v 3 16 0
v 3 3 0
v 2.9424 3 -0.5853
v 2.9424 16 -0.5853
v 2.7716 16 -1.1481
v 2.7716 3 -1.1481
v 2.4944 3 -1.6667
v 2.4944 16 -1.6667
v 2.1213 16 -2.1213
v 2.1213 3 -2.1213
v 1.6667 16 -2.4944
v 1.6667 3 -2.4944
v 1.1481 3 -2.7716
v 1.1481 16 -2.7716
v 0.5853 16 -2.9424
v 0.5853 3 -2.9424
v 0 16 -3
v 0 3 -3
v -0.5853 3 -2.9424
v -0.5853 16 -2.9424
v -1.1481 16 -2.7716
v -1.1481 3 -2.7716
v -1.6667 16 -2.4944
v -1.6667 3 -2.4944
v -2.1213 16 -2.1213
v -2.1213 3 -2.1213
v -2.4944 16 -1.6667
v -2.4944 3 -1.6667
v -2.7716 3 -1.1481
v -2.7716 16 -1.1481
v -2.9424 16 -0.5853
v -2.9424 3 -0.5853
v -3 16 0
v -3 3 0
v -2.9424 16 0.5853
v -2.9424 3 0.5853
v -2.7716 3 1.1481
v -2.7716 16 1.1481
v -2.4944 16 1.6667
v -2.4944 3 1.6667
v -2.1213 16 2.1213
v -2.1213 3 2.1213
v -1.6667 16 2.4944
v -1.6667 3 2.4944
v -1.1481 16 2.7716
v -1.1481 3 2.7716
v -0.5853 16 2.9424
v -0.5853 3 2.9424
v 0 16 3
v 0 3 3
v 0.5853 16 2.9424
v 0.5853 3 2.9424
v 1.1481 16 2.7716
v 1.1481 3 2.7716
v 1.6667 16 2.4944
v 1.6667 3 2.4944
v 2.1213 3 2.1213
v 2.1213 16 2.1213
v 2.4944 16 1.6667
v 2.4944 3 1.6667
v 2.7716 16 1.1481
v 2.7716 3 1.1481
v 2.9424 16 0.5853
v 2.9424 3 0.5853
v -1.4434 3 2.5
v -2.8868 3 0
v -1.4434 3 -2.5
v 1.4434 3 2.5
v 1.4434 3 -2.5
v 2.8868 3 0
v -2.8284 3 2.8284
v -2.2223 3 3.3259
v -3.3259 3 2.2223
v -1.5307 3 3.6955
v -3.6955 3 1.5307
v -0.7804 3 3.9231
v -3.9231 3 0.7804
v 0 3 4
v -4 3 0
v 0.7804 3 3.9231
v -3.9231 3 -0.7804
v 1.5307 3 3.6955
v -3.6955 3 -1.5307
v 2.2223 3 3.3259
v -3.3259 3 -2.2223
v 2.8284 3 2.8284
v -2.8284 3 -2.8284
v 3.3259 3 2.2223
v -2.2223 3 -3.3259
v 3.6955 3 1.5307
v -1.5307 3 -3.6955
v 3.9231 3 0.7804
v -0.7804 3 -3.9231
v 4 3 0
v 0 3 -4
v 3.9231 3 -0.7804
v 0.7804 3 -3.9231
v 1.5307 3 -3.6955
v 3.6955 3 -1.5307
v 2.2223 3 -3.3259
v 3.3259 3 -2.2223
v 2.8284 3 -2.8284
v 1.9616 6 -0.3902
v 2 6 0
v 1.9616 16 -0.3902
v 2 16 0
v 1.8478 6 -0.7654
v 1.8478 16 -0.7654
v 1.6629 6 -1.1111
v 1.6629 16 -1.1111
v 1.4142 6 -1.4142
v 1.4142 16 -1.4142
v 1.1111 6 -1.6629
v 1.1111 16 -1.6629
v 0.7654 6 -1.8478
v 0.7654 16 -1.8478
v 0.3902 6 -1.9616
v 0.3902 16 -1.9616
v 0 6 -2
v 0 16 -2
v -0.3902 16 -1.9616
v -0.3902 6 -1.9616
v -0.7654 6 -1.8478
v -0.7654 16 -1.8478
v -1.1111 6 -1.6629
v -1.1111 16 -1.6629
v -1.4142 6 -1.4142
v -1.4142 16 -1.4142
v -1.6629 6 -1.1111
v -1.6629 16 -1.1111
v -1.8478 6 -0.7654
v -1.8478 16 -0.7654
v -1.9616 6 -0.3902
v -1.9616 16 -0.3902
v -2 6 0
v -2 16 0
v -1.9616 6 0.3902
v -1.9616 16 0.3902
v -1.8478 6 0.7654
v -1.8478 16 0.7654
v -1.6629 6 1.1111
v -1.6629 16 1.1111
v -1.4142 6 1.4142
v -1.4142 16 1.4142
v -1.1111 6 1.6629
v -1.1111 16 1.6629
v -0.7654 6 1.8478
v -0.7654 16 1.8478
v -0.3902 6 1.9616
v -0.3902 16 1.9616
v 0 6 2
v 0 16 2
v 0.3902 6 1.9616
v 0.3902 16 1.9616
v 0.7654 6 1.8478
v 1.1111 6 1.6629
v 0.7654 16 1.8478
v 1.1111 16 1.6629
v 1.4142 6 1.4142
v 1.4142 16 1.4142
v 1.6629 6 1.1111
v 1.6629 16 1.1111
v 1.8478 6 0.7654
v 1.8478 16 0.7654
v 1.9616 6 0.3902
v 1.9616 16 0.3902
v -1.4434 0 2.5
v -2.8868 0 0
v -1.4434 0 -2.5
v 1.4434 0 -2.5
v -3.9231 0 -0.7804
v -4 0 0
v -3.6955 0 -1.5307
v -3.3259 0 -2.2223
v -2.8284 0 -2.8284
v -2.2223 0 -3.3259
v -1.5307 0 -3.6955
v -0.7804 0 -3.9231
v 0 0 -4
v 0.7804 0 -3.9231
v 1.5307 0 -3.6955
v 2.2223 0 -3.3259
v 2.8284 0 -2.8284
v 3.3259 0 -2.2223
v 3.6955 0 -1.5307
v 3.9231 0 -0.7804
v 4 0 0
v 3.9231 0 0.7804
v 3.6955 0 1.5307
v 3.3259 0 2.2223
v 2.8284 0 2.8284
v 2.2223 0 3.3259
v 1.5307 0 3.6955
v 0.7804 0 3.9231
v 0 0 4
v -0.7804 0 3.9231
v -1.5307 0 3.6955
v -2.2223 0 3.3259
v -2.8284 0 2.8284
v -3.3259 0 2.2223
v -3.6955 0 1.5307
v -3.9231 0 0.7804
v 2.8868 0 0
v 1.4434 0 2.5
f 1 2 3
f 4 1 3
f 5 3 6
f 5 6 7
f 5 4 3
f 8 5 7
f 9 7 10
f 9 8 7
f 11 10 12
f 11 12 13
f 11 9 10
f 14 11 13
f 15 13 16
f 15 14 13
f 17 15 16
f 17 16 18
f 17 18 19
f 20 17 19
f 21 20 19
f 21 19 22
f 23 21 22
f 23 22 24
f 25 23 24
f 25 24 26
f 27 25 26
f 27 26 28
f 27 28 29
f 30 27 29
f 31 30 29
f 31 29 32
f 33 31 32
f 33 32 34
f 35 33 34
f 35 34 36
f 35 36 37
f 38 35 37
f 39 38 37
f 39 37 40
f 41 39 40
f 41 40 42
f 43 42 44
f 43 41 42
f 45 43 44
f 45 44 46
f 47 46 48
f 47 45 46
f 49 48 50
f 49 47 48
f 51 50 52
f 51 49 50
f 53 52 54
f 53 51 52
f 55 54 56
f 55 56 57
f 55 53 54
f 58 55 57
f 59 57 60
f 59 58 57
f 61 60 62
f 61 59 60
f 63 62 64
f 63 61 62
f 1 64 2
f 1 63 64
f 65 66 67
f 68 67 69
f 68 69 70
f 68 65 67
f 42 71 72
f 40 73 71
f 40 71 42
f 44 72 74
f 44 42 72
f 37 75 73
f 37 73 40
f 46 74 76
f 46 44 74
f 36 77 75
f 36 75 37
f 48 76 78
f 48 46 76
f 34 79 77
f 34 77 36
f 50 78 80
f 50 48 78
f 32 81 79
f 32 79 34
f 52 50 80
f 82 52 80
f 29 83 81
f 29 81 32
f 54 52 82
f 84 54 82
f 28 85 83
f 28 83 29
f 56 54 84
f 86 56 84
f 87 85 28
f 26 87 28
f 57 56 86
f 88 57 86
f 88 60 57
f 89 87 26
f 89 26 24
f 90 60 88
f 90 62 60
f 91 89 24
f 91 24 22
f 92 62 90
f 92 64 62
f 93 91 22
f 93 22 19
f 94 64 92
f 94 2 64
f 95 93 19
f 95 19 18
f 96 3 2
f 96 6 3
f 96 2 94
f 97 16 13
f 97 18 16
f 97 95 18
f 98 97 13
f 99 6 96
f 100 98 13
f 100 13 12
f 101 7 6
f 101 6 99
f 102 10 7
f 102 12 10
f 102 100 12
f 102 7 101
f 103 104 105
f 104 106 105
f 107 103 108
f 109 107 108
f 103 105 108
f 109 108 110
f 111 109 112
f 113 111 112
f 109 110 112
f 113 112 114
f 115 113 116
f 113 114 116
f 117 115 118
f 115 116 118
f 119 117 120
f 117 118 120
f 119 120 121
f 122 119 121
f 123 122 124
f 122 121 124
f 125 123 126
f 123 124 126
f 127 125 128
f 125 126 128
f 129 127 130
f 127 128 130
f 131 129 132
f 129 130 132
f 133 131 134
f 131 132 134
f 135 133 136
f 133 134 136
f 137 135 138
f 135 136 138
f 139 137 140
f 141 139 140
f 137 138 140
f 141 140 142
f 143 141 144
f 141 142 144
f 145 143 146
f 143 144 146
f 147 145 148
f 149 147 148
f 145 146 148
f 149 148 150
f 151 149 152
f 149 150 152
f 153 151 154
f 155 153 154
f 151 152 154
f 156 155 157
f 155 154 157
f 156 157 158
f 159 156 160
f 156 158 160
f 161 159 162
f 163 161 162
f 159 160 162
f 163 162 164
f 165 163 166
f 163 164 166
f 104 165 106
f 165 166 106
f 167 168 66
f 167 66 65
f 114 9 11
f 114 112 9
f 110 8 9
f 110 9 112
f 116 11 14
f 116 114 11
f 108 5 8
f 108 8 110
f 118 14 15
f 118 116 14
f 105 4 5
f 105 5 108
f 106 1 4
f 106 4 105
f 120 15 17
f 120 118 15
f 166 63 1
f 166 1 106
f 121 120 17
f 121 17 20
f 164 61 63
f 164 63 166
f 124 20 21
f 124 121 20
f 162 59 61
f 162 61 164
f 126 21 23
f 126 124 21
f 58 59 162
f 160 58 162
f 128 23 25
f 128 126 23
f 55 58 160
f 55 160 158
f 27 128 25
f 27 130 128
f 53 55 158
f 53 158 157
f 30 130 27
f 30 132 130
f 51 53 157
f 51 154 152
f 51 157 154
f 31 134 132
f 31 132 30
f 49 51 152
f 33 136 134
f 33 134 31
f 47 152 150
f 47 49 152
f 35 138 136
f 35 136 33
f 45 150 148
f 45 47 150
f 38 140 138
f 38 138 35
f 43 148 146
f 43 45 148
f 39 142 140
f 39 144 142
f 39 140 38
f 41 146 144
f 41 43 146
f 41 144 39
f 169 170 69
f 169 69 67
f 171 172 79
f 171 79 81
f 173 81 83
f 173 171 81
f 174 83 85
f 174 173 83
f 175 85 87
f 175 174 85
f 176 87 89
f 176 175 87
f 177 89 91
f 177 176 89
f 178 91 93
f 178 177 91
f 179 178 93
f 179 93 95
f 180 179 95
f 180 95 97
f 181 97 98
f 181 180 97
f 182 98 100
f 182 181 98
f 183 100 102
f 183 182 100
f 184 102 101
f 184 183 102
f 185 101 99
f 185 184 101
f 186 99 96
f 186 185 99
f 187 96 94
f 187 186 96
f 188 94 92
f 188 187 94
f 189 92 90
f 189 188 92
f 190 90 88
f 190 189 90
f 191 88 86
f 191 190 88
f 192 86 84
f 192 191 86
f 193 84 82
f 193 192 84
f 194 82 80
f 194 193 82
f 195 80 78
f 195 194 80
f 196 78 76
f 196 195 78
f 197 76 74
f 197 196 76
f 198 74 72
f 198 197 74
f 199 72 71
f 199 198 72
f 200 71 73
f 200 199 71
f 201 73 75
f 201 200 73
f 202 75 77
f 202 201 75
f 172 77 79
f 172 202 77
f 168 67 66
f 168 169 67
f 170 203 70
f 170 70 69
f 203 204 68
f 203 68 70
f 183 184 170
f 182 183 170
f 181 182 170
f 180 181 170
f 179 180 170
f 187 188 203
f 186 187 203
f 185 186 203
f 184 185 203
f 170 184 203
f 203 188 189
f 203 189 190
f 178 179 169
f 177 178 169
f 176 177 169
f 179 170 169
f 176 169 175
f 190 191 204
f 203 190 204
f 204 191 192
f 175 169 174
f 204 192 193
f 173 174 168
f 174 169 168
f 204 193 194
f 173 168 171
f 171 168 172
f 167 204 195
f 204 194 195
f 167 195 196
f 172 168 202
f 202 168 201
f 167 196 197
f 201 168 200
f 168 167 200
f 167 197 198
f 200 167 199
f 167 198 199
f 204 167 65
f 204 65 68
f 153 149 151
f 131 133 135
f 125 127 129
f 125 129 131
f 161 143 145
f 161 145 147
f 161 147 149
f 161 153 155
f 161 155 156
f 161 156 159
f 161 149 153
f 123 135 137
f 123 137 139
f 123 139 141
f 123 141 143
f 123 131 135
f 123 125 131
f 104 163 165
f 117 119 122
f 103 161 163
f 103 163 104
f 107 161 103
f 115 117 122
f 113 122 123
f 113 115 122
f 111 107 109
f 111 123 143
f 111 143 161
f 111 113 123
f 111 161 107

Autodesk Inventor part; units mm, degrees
ref_plane "YZ Plane" through (0, 0, 0) normal (1, 0, 0) x (0, 1, 0)
ref_plane "XZ Plane" through (0, 0, 0) normal (0, 1, 0) x (-1, 0, 0)
ref_plane "XY Plane" through (0, 0, 0) normal (0, 0, 1) x (1, 0, 0)
sketch "Náčrt1" plane through (0, 0, 0) normal (0, 1, 0) x (-1, 0, 0)
  circle A0 centre (0, 0) radius 4
  dimension "nutOuterDia" = 8
extrude "Vysunutí2" add sketch "Náčrt1" along normal blind 16
sketch "Náčrt3" plane through (0, 0, 0) normal (0, -1, 0) x (1, 0, 0)
  circle A0 centre (0, 0) radius 4 projected
  line L0 (-2.8868, 0) -> (-1.4434, 2.5)
  line L1 (-1.4434, 2.5) -> (1.4434, 2.5)
  line L2 (1.4434, 2.5) -> (2.8868, 0)
  line L3 (2.8868, 0) -> (1.4434, -2.5)
  line L4 (1.4434, -2.5) -> (-1.4434, -2.5)
  line L5 (-1.4434, -2.5) -> (-2.8868, 0)
  dimension "keyHoleSize" = 5
extrude "Vysunutí3" cut sketch "Náčrt3" against normal blind 3 contours L0 L1 L2 L3 L4 L5
sketch "Náčrt4" plane through (0, 16, 0) normal (0, 1, 0) x (1, 0, 0)
  circle A0 centre (0, 0) radius 4 projected
  circle A1 centre (0, 0) radius 3
extrude "Vysunutí4" cut sketch "Náčrt4" against normal blind 13
sketch "Náčrt5" plane through (0, 16, 0) normal (0, 1, 0) x (1, 0, 0)
  circle A0 centre (0, 0) radius 3 projected
  circle A1 centre (0, 0) radius 2
extrude "Vysunutí5" cut sketch "Náčrt5" against normal blind 10 contours A1
thread "Závit2" size "M4x0.7" class "6H" standard "ANSI Metric M Profile" full length
properties part number "nut"
